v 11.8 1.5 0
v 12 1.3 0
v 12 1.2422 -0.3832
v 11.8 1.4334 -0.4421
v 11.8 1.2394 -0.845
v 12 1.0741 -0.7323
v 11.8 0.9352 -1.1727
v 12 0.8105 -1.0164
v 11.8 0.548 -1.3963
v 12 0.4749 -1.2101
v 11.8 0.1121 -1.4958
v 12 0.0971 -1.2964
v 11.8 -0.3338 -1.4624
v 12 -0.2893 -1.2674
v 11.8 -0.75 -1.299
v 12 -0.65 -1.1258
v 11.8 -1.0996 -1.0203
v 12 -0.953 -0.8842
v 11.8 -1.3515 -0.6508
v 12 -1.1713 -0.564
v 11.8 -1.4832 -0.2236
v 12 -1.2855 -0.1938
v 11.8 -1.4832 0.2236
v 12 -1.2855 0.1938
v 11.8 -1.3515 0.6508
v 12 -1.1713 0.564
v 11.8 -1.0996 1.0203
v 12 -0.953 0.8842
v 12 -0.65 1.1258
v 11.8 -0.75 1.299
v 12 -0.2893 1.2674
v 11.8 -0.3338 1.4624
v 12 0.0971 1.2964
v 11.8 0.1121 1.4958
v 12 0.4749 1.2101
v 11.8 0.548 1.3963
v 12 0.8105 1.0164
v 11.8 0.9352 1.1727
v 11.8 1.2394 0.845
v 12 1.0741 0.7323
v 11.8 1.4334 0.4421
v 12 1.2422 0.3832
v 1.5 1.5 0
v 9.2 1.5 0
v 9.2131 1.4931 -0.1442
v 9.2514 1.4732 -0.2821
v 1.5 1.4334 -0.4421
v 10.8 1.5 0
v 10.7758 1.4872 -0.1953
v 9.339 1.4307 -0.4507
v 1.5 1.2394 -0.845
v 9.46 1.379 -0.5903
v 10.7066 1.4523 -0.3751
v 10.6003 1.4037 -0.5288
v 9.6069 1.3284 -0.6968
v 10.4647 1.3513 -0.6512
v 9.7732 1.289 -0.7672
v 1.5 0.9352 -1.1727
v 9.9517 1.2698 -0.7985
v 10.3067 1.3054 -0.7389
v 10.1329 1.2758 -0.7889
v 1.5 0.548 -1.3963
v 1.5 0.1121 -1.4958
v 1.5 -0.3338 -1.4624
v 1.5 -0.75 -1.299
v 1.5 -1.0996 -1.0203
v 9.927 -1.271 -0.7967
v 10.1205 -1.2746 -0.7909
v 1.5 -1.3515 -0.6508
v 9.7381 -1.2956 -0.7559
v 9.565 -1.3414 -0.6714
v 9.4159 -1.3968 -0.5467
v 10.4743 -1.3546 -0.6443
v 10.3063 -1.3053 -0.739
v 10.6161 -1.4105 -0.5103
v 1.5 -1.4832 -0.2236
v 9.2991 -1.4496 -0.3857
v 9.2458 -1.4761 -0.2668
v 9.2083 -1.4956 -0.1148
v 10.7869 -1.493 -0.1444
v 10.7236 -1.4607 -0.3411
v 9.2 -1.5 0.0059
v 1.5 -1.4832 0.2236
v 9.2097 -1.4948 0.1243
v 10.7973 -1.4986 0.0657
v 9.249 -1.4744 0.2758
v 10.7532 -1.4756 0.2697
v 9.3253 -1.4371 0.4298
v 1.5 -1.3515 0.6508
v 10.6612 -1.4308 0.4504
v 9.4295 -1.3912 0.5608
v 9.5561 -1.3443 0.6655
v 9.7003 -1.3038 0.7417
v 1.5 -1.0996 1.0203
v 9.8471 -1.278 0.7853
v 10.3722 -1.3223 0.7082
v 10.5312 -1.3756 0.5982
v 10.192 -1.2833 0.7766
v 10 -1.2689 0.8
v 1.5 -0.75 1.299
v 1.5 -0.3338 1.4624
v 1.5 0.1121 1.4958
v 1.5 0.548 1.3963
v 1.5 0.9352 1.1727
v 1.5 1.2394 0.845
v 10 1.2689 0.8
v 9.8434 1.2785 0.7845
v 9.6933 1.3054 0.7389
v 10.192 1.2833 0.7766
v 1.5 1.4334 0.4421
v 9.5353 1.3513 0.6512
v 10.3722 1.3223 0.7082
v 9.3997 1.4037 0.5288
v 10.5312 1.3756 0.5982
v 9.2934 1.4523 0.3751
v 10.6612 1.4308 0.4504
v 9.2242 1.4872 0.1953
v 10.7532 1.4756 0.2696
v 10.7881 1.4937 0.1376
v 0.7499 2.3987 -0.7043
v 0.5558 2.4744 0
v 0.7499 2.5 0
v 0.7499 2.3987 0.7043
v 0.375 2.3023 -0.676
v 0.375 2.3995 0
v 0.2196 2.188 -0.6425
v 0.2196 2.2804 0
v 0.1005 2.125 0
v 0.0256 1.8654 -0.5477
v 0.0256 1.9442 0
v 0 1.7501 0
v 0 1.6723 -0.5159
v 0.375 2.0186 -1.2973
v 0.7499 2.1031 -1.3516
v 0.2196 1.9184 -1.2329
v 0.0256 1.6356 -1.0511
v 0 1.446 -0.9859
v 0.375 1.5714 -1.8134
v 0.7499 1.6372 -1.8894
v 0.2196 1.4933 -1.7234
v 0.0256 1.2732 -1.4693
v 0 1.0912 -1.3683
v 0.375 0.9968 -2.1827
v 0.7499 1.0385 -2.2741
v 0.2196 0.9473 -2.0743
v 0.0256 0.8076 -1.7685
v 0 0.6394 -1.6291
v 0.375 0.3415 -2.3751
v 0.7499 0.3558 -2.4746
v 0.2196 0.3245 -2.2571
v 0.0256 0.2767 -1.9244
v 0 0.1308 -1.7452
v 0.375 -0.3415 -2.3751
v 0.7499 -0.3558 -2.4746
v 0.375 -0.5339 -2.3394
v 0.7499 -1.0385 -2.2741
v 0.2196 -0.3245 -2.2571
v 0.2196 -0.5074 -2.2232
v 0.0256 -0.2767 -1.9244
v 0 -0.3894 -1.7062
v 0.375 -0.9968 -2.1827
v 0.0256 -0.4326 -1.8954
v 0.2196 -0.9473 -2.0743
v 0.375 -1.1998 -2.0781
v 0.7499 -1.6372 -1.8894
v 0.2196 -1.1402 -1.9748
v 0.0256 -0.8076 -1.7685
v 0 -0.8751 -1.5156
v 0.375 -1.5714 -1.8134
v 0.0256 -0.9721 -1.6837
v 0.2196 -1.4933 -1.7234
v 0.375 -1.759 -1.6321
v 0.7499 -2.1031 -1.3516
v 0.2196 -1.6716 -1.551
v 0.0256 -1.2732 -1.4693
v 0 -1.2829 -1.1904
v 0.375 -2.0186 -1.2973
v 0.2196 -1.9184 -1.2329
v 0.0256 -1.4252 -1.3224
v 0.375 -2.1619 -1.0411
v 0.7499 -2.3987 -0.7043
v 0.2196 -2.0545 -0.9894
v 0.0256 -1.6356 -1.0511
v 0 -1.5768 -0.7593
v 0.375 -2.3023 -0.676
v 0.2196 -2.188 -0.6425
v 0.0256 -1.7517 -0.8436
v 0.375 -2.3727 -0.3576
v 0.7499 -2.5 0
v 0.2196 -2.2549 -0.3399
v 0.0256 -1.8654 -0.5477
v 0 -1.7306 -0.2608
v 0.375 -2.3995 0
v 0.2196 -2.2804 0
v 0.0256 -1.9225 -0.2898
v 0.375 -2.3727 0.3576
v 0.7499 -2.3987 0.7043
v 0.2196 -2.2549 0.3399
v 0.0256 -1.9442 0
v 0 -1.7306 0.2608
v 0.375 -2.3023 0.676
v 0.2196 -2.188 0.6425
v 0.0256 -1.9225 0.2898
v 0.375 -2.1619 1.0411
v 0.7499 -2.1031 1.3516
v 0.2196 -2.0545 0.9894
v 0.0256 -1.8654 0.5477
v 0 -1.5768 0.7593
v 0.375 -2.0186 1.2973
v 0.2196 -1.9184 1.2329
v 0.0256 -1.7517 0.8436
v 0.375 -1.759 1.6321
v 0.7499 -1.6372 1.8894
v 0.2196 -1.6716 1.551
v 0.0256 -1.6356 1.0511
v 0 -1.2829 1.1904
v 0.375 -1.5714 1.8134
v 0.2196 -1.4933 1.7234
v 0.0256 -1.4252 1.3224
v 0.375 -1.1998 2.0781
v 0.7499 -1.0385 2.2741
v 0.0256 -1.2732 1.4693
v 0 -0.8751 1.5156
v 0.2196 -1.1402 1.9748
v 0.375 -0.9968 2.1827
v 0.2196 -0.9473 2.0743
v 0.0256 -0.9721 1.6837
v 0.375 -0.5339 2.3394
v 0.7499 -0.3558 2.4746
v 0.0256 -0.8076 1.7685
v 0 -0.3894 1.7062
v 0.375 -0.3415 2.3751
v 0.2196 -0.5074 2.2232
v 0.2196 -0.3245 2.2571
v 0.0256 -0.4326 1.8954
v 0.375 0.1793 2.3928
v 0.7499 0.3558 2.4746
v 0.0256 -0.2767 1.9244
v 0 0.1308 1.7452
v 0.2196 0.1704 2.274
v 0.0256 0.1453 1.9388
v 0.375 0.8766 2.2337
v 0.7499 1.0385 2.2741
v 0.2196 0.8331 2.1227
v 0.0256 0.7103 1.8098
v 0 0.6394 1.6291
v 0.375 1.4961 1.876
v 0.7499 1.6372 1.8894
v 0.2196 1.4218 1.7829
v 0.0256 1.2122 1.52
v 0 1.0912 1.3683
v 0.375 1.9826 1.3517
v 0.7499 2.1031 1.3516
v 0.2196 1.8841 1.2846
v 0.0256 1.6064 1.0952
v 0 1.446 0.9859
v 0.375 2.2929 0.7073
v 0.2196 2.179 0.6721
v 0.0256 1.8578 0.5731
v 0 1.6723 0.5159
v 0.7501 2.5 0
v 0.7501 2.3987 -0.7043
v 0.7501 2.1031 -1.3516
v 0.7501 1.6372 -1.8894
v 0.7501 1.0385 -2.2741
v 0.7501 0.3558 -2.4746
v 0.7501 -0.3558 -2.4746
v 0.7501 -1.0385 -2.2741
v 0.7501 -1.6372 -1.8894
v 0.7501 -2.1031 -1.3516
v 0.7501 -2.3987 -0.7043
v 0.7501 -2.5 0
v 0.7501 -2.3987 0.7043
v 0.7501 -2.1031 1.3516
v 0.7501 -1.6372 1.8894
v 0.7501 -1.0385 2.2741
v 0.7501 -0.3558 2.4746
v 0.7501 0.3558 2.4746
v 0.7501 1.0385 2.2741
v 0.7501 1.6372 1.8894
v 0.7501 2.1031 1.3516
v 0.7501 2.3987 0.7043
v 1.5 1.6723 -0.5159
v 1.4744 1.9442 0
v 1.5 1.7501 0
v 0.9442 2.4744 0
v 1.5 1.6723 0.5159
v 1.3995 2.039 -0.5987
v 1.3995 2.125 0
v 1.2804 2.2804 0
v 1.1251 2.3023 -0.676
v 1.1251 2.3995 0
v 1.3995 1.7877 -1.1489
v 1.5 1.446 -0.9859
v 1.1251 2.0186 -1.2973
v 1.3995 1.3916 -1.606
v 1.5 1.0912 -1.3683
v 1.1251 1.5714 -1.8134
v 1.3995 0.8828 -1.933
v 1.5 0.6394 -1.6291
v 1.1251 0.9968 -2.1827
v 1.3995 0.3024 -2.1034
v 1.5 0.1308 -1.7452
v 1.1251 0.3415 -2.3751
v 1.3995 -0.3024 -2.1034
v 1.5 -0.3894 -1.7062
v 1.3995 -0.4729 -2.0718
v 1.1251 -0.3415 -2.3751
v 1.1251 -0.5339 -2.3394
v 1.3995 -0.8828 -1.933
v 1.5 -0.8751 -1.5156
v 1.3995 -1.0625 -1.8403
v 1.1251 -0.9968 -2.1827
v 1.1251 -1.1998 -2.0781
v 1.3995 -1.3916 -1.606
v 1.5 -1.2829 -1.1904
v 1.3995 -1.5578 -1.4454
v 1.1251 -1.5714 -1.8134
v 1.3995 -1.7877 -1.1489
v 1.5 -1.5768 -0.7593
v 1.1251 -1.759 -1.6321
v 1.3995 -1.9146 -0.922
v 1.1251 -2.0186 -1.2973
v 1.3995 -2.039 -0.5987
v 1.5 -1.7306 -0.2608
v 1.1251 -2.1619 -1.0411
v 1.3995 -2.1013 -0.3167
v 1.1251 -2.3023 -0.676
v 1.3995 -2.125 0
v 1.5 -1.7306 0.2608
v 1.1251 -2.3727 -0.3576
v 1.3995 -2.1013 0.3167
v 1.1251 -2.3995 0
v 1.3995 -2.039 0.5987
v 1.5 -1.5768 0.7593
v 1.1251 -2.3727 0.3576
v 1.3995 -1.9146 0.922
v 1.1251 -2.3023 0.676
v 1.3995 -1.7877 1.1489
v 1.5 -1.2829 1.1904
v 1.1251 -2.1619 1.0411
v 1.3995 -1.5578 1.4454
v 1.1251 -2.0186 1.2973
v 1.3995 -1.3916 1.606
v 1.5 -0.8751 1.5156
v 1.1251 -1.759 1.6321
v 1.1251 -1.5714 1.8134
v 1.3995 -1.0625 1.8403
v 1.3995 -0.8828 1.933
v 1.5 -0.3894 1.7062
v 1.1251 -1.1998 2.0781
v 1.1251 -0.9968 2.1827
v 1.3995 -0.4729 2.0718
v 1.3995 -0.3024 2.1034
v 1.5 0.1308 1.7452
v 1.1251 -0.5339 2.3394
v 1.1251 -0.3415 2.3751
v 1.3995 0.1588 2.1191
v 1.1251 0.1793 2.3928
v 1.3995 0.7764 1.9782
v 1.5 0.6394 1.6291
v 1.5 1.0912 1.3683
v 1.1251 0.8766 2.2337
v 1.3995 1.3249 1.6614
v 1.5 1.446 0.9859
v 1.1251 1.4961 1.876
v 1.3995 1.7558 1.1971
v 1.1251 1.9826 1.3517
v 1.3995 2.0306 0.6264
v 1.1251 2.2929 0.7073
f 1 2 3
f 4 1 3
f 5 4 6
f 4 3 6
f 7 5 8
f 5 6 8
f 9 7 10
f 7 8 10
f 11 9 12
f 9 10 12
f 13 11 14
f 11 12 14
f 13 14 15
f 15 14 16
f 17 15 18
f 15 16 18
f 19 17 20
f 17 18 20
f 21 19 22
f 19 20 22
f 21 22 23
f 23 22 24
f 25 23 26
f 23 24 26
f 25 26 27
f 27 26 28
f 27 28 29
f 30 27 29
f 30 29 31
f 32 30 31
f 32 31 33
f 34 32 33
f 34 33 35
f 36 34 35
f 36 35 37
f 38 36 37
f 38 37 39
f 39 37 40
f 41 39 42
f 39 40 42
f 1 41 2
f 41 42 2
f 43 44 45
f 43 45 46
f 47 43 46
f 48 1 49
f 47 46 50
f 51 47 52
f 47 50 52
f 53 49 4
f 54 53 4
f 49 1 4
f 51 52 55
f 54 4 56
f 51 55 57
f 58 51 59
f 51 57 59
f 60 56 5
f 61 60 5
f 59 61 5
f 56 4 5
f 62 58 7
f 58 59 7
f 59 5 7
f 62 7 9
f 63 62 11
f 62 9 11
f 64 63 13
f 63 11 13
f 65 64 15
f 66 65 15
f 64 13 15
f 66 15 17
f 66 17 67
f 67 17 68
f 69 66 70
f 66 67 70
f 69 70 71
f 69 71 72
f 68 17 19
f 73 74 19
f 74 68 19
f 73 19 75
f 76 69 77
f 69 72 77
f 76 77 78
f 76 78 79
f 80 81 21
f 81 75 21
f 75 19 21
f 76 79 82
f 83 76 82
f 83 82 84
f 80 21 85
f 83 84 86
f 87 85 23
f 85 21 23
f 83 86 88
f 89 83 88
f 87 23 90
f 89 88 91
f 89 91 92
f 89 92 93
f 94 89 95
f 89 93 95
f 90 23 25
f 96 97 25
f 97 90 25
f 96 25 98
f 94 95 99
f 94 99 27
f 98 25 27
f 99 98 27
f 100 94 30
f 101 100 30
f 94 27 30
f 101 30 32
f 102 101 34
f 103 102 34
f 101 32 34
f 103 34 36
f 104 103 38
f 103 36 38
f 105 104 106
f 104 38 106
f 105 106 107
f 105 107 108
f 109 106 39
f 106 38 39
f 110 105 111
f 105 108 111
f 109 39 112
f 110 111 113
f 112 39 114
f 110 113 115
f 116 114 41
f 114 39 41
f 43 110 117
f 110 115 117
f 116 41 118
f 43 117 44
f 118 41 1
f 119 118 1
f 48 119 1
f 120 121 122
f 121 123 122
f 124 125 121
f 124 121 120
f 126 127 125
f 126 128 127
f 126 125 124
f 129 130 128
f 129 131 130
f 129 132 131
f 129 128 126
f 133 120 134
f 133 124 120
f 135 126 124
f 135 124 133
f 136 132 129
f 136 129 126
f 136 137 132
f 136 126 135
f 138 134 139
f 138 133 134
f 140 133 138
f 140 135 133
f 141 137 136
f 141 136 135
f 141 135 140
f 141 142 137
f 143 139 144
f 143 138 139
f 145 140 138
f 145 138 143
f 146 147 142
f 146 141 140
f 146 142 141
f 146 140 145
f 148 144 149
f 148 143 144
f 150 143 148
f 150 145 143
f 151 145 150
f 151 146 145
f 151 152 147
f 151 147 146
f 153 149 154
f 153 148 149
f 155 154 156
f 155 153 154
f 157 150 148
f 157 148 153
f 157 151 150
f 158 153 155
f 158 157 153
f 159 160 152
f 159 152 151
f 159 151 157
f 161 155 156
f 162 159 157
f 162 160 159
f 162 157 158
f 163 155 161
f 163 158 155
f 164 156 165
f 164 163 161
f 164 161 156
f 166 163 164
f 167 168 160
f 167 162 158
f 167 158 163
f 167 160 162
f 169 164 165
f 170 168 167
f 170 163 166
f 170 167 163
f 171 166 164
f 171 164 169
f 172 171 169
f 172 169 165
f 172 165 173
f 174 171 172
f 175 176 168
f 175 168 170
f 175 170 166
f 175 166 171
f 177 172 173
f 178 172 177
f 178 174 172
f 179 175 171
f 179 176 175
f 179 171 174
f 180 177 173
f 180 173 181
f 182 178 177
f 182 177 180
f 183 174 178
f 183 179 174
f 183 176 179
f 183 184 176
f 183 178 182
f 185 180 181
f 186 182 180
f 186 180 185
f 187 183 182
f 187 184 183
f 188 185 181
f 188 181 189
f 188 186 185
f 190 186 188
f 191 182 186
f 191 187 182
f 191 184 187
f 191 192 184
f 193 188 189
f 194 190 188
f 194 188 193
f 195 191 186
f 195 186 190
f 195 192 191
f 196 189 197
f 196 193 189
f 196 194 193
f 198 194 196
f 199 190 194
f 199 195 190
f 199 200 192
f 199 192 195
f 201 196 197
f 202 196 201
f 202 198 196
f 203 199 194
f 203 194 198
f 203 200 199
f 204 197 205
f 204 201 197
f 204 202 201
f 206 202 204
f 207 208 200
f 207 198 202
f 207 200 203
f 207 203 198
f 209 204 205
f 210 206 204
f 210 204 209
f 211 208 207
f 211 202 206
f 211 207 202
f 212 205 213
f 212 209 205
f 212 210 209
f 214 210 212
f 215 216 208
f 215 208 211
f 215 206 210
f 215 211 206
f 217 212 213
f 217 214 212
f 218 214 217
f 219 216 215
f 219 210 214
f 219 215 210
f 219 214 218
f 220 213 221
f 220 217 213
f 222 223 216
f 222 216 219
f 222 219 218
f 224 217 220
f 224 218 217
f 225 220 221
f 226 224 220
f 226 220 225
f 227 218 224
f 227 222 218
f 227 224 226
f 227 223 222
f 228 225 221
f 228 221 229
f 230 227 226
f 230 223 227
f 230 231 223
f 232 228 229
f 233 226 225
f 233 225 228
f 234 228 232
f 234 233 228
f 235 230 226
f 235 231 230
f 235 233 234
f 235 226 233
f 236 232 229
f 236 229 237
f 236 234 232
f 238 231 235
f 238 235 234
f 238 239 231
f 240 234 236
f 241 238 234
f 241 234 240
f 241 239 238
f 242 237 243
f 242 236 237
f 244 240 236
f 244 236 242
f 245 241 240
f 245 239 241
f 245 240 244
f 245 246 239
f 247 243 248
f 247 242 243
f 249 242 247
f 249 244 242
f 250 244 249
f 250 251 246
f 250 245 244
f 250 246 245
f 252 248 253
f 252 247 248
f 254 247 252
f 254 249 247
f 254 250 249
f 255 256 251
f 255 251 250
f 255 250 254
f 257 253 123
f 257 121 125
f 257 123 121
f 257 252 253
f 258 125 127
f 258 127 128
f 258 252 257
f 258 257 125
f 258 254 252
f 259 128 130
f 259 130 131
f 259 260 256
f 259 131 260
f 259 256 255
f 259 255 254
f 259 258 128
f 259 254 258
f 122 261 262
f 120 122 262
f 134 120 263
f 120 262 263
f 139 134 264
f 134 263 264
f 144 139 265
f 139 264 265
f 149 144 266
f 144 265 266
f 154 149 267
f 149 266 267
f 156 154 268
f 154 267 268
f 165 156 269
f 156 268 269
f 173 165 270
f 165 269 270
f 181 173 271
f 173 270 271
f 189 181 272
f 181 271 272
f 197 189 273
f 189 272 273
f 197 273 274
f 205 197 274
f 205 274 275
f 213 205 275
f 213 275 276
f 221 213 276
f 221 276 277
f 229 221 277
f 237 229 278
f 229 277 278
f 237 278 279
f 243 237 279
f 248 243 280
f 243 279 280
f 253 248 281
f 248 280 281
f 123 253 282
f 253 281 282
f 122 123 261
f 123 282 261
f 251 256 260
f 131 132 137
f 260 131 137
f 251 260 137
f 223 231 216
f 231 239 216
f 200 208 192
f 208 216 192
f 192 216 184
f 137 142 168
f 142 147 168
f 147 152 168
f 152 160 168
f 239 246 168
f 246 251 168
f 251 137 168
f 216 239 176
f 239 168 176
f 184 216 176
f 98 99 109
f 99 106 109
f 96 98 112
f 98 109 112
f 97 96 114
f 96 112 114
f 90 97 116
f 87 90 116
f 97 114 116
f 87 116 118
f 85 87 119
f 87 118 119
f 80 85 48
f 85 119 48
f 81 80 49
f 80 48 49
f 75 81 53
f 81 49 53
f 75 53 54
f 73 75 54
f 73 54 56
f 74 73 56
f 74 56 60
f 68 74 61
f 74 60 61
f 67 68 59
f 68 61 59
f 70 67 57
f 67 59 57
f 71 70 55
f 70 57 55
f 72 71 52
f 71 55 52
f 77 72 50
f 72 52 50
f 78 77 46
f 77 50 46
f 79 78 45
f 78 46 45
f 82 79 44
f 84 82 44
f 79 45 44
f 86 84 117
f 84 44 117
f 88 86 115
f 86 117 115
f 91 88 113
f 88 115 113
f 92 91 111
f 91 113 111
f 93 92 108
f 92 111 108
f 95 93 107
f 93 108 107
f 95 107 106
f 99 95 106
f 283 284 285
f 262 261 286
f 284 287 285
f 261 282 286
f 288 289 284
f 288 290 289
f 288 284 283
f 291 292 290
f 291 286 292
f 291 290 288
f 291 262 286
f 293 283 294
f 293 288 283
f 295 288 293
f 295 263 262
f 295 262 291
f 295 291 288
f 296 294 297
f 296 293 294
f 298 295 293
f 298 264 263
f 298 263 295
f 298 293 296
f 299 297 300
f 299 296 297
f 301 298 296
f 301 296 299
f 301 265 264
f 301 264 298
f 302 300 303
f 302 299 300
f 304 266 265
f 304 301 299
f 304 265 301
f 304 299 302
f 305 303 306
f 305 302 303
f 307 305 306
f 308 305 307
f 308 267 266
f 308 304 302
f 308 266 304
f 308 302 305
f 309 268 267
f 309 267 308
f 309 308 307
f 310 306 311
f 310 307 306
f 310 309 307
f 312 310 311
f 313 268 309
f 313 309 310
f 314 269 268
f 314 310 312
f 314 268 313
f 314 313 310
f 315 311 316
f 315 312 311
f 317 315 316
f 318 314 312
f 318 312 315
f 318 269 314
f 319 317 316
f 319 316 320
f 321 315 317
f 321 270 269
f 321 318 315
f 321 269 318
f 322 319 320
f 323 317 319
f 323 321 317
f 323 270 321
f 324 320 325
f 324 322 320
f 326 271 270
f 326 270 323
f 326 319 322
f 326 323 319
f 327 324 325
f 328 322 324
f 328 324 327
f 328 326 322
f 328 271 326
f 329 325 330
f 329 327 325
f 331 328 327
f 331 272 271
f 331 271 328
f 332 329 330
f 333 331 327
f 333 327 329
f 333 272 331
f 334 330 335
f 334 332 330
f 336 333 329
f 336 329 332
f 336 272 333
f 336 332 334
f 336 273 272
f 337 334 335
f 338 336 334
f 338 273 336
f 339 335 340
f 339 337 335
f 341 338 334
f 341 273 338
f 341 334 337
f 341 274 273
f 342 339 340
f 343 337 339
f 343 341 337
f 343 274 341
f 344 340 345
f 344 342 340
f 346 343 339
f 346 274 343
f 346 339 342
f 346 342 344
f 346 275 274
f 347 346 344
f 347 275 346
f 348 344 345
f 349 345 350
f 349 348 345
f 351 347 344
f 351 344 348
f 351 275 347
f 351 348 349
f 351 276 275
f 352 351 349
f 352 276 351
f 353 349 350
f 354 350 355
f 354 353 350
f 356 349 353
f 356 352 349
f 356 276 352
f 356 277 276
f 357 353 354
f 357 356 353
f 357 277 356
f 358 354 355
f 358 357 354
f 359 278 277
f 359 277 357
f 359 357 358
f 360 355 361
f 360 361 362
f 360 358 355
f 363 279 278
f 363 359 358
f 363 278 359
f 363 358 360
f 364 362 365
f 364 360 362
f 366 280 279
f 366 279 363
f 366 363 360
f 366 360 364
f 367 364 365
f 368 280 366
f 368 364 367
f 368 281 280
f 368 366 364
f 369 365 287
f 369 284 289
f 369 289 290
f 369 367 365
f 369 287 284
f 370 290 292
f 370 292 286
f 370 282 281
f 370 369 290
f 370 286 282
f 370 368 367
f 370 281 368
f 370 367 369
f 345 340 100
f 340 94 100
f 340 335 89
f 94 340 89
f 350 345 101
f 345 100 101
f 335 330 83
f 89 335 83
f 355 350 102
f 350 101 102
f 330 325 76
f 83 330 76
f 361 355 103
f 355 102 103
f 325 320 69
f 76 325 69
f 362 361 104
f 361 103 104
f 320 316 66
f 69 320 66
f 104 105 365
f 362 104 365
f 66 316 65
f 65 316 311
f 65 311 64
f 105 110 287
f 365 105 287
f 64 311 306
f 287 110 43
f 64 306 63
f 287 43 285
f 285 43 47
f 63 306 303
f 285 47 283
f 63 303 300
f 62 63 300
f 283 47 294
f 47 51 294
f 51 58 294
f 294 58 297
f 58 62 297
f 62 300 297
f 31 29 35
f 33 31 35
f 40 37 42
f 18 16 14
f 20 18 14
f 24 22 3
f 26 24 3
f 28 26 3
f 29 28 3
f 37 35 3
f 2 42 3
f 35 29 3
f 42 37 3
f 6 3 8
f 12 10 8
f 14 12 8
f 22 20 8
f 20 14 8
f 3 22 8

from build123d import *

# Parameters (mm, degrees)
SKETCH_2_R          = 0.8
CUT_EXTRUDE_1_DEPTH = 10
CHAMFER_1_SIZE      = 0.2
FILLET_1_R          = 0.75


with BuildPart() as part:
    # 草图1 → 旋转1 (revolve)
    with BuildSketch(Plane.XY):
        Polygon((0, 0), (0, 2.5), (1.5, 2.5), (1.5, 1.5), (12, 1.5), (12, 0), align=None)
    revolve(axis=Axis((12, 0, 0), (-1, 0, 0)))

    # 草图2 → 切除-拉伸1 (cut, symmetric)
    with BuildSketch(Plane(origin=(0, 0, 0), x_dir=(1, 0, 0), z_dir=(0, 1, 0))):
        with Locations(Location((10, 0, 0), (0, 0, 270))):
            Circle(SKETCH_2_R)
    extrude(amount=CUT_EXTRUDE_1_DEPTH, both=True, mode=Mode.SUBTRACT)

    # 倒角1
    chamfer_1_edges = [part.edges().sort_by_distance(p)[0] for p in [
        (12, -1.5, 0),
    ]]
    chamfer(chamfer_1_edges, length=CHAMFER_1_SIZE)

    # 圆角1
    fillet_1_edges = [part.edges().sort_by_distance(p)[0] for p in [
        (1.5, -2.5, 0),
        (0, -2.5, 0),
    ]]
    fillet(fillet_1_edges, radius=FILLET_1_R - 0.0001)  # a hair under: the kernel refuses the full size


solid = part.part
